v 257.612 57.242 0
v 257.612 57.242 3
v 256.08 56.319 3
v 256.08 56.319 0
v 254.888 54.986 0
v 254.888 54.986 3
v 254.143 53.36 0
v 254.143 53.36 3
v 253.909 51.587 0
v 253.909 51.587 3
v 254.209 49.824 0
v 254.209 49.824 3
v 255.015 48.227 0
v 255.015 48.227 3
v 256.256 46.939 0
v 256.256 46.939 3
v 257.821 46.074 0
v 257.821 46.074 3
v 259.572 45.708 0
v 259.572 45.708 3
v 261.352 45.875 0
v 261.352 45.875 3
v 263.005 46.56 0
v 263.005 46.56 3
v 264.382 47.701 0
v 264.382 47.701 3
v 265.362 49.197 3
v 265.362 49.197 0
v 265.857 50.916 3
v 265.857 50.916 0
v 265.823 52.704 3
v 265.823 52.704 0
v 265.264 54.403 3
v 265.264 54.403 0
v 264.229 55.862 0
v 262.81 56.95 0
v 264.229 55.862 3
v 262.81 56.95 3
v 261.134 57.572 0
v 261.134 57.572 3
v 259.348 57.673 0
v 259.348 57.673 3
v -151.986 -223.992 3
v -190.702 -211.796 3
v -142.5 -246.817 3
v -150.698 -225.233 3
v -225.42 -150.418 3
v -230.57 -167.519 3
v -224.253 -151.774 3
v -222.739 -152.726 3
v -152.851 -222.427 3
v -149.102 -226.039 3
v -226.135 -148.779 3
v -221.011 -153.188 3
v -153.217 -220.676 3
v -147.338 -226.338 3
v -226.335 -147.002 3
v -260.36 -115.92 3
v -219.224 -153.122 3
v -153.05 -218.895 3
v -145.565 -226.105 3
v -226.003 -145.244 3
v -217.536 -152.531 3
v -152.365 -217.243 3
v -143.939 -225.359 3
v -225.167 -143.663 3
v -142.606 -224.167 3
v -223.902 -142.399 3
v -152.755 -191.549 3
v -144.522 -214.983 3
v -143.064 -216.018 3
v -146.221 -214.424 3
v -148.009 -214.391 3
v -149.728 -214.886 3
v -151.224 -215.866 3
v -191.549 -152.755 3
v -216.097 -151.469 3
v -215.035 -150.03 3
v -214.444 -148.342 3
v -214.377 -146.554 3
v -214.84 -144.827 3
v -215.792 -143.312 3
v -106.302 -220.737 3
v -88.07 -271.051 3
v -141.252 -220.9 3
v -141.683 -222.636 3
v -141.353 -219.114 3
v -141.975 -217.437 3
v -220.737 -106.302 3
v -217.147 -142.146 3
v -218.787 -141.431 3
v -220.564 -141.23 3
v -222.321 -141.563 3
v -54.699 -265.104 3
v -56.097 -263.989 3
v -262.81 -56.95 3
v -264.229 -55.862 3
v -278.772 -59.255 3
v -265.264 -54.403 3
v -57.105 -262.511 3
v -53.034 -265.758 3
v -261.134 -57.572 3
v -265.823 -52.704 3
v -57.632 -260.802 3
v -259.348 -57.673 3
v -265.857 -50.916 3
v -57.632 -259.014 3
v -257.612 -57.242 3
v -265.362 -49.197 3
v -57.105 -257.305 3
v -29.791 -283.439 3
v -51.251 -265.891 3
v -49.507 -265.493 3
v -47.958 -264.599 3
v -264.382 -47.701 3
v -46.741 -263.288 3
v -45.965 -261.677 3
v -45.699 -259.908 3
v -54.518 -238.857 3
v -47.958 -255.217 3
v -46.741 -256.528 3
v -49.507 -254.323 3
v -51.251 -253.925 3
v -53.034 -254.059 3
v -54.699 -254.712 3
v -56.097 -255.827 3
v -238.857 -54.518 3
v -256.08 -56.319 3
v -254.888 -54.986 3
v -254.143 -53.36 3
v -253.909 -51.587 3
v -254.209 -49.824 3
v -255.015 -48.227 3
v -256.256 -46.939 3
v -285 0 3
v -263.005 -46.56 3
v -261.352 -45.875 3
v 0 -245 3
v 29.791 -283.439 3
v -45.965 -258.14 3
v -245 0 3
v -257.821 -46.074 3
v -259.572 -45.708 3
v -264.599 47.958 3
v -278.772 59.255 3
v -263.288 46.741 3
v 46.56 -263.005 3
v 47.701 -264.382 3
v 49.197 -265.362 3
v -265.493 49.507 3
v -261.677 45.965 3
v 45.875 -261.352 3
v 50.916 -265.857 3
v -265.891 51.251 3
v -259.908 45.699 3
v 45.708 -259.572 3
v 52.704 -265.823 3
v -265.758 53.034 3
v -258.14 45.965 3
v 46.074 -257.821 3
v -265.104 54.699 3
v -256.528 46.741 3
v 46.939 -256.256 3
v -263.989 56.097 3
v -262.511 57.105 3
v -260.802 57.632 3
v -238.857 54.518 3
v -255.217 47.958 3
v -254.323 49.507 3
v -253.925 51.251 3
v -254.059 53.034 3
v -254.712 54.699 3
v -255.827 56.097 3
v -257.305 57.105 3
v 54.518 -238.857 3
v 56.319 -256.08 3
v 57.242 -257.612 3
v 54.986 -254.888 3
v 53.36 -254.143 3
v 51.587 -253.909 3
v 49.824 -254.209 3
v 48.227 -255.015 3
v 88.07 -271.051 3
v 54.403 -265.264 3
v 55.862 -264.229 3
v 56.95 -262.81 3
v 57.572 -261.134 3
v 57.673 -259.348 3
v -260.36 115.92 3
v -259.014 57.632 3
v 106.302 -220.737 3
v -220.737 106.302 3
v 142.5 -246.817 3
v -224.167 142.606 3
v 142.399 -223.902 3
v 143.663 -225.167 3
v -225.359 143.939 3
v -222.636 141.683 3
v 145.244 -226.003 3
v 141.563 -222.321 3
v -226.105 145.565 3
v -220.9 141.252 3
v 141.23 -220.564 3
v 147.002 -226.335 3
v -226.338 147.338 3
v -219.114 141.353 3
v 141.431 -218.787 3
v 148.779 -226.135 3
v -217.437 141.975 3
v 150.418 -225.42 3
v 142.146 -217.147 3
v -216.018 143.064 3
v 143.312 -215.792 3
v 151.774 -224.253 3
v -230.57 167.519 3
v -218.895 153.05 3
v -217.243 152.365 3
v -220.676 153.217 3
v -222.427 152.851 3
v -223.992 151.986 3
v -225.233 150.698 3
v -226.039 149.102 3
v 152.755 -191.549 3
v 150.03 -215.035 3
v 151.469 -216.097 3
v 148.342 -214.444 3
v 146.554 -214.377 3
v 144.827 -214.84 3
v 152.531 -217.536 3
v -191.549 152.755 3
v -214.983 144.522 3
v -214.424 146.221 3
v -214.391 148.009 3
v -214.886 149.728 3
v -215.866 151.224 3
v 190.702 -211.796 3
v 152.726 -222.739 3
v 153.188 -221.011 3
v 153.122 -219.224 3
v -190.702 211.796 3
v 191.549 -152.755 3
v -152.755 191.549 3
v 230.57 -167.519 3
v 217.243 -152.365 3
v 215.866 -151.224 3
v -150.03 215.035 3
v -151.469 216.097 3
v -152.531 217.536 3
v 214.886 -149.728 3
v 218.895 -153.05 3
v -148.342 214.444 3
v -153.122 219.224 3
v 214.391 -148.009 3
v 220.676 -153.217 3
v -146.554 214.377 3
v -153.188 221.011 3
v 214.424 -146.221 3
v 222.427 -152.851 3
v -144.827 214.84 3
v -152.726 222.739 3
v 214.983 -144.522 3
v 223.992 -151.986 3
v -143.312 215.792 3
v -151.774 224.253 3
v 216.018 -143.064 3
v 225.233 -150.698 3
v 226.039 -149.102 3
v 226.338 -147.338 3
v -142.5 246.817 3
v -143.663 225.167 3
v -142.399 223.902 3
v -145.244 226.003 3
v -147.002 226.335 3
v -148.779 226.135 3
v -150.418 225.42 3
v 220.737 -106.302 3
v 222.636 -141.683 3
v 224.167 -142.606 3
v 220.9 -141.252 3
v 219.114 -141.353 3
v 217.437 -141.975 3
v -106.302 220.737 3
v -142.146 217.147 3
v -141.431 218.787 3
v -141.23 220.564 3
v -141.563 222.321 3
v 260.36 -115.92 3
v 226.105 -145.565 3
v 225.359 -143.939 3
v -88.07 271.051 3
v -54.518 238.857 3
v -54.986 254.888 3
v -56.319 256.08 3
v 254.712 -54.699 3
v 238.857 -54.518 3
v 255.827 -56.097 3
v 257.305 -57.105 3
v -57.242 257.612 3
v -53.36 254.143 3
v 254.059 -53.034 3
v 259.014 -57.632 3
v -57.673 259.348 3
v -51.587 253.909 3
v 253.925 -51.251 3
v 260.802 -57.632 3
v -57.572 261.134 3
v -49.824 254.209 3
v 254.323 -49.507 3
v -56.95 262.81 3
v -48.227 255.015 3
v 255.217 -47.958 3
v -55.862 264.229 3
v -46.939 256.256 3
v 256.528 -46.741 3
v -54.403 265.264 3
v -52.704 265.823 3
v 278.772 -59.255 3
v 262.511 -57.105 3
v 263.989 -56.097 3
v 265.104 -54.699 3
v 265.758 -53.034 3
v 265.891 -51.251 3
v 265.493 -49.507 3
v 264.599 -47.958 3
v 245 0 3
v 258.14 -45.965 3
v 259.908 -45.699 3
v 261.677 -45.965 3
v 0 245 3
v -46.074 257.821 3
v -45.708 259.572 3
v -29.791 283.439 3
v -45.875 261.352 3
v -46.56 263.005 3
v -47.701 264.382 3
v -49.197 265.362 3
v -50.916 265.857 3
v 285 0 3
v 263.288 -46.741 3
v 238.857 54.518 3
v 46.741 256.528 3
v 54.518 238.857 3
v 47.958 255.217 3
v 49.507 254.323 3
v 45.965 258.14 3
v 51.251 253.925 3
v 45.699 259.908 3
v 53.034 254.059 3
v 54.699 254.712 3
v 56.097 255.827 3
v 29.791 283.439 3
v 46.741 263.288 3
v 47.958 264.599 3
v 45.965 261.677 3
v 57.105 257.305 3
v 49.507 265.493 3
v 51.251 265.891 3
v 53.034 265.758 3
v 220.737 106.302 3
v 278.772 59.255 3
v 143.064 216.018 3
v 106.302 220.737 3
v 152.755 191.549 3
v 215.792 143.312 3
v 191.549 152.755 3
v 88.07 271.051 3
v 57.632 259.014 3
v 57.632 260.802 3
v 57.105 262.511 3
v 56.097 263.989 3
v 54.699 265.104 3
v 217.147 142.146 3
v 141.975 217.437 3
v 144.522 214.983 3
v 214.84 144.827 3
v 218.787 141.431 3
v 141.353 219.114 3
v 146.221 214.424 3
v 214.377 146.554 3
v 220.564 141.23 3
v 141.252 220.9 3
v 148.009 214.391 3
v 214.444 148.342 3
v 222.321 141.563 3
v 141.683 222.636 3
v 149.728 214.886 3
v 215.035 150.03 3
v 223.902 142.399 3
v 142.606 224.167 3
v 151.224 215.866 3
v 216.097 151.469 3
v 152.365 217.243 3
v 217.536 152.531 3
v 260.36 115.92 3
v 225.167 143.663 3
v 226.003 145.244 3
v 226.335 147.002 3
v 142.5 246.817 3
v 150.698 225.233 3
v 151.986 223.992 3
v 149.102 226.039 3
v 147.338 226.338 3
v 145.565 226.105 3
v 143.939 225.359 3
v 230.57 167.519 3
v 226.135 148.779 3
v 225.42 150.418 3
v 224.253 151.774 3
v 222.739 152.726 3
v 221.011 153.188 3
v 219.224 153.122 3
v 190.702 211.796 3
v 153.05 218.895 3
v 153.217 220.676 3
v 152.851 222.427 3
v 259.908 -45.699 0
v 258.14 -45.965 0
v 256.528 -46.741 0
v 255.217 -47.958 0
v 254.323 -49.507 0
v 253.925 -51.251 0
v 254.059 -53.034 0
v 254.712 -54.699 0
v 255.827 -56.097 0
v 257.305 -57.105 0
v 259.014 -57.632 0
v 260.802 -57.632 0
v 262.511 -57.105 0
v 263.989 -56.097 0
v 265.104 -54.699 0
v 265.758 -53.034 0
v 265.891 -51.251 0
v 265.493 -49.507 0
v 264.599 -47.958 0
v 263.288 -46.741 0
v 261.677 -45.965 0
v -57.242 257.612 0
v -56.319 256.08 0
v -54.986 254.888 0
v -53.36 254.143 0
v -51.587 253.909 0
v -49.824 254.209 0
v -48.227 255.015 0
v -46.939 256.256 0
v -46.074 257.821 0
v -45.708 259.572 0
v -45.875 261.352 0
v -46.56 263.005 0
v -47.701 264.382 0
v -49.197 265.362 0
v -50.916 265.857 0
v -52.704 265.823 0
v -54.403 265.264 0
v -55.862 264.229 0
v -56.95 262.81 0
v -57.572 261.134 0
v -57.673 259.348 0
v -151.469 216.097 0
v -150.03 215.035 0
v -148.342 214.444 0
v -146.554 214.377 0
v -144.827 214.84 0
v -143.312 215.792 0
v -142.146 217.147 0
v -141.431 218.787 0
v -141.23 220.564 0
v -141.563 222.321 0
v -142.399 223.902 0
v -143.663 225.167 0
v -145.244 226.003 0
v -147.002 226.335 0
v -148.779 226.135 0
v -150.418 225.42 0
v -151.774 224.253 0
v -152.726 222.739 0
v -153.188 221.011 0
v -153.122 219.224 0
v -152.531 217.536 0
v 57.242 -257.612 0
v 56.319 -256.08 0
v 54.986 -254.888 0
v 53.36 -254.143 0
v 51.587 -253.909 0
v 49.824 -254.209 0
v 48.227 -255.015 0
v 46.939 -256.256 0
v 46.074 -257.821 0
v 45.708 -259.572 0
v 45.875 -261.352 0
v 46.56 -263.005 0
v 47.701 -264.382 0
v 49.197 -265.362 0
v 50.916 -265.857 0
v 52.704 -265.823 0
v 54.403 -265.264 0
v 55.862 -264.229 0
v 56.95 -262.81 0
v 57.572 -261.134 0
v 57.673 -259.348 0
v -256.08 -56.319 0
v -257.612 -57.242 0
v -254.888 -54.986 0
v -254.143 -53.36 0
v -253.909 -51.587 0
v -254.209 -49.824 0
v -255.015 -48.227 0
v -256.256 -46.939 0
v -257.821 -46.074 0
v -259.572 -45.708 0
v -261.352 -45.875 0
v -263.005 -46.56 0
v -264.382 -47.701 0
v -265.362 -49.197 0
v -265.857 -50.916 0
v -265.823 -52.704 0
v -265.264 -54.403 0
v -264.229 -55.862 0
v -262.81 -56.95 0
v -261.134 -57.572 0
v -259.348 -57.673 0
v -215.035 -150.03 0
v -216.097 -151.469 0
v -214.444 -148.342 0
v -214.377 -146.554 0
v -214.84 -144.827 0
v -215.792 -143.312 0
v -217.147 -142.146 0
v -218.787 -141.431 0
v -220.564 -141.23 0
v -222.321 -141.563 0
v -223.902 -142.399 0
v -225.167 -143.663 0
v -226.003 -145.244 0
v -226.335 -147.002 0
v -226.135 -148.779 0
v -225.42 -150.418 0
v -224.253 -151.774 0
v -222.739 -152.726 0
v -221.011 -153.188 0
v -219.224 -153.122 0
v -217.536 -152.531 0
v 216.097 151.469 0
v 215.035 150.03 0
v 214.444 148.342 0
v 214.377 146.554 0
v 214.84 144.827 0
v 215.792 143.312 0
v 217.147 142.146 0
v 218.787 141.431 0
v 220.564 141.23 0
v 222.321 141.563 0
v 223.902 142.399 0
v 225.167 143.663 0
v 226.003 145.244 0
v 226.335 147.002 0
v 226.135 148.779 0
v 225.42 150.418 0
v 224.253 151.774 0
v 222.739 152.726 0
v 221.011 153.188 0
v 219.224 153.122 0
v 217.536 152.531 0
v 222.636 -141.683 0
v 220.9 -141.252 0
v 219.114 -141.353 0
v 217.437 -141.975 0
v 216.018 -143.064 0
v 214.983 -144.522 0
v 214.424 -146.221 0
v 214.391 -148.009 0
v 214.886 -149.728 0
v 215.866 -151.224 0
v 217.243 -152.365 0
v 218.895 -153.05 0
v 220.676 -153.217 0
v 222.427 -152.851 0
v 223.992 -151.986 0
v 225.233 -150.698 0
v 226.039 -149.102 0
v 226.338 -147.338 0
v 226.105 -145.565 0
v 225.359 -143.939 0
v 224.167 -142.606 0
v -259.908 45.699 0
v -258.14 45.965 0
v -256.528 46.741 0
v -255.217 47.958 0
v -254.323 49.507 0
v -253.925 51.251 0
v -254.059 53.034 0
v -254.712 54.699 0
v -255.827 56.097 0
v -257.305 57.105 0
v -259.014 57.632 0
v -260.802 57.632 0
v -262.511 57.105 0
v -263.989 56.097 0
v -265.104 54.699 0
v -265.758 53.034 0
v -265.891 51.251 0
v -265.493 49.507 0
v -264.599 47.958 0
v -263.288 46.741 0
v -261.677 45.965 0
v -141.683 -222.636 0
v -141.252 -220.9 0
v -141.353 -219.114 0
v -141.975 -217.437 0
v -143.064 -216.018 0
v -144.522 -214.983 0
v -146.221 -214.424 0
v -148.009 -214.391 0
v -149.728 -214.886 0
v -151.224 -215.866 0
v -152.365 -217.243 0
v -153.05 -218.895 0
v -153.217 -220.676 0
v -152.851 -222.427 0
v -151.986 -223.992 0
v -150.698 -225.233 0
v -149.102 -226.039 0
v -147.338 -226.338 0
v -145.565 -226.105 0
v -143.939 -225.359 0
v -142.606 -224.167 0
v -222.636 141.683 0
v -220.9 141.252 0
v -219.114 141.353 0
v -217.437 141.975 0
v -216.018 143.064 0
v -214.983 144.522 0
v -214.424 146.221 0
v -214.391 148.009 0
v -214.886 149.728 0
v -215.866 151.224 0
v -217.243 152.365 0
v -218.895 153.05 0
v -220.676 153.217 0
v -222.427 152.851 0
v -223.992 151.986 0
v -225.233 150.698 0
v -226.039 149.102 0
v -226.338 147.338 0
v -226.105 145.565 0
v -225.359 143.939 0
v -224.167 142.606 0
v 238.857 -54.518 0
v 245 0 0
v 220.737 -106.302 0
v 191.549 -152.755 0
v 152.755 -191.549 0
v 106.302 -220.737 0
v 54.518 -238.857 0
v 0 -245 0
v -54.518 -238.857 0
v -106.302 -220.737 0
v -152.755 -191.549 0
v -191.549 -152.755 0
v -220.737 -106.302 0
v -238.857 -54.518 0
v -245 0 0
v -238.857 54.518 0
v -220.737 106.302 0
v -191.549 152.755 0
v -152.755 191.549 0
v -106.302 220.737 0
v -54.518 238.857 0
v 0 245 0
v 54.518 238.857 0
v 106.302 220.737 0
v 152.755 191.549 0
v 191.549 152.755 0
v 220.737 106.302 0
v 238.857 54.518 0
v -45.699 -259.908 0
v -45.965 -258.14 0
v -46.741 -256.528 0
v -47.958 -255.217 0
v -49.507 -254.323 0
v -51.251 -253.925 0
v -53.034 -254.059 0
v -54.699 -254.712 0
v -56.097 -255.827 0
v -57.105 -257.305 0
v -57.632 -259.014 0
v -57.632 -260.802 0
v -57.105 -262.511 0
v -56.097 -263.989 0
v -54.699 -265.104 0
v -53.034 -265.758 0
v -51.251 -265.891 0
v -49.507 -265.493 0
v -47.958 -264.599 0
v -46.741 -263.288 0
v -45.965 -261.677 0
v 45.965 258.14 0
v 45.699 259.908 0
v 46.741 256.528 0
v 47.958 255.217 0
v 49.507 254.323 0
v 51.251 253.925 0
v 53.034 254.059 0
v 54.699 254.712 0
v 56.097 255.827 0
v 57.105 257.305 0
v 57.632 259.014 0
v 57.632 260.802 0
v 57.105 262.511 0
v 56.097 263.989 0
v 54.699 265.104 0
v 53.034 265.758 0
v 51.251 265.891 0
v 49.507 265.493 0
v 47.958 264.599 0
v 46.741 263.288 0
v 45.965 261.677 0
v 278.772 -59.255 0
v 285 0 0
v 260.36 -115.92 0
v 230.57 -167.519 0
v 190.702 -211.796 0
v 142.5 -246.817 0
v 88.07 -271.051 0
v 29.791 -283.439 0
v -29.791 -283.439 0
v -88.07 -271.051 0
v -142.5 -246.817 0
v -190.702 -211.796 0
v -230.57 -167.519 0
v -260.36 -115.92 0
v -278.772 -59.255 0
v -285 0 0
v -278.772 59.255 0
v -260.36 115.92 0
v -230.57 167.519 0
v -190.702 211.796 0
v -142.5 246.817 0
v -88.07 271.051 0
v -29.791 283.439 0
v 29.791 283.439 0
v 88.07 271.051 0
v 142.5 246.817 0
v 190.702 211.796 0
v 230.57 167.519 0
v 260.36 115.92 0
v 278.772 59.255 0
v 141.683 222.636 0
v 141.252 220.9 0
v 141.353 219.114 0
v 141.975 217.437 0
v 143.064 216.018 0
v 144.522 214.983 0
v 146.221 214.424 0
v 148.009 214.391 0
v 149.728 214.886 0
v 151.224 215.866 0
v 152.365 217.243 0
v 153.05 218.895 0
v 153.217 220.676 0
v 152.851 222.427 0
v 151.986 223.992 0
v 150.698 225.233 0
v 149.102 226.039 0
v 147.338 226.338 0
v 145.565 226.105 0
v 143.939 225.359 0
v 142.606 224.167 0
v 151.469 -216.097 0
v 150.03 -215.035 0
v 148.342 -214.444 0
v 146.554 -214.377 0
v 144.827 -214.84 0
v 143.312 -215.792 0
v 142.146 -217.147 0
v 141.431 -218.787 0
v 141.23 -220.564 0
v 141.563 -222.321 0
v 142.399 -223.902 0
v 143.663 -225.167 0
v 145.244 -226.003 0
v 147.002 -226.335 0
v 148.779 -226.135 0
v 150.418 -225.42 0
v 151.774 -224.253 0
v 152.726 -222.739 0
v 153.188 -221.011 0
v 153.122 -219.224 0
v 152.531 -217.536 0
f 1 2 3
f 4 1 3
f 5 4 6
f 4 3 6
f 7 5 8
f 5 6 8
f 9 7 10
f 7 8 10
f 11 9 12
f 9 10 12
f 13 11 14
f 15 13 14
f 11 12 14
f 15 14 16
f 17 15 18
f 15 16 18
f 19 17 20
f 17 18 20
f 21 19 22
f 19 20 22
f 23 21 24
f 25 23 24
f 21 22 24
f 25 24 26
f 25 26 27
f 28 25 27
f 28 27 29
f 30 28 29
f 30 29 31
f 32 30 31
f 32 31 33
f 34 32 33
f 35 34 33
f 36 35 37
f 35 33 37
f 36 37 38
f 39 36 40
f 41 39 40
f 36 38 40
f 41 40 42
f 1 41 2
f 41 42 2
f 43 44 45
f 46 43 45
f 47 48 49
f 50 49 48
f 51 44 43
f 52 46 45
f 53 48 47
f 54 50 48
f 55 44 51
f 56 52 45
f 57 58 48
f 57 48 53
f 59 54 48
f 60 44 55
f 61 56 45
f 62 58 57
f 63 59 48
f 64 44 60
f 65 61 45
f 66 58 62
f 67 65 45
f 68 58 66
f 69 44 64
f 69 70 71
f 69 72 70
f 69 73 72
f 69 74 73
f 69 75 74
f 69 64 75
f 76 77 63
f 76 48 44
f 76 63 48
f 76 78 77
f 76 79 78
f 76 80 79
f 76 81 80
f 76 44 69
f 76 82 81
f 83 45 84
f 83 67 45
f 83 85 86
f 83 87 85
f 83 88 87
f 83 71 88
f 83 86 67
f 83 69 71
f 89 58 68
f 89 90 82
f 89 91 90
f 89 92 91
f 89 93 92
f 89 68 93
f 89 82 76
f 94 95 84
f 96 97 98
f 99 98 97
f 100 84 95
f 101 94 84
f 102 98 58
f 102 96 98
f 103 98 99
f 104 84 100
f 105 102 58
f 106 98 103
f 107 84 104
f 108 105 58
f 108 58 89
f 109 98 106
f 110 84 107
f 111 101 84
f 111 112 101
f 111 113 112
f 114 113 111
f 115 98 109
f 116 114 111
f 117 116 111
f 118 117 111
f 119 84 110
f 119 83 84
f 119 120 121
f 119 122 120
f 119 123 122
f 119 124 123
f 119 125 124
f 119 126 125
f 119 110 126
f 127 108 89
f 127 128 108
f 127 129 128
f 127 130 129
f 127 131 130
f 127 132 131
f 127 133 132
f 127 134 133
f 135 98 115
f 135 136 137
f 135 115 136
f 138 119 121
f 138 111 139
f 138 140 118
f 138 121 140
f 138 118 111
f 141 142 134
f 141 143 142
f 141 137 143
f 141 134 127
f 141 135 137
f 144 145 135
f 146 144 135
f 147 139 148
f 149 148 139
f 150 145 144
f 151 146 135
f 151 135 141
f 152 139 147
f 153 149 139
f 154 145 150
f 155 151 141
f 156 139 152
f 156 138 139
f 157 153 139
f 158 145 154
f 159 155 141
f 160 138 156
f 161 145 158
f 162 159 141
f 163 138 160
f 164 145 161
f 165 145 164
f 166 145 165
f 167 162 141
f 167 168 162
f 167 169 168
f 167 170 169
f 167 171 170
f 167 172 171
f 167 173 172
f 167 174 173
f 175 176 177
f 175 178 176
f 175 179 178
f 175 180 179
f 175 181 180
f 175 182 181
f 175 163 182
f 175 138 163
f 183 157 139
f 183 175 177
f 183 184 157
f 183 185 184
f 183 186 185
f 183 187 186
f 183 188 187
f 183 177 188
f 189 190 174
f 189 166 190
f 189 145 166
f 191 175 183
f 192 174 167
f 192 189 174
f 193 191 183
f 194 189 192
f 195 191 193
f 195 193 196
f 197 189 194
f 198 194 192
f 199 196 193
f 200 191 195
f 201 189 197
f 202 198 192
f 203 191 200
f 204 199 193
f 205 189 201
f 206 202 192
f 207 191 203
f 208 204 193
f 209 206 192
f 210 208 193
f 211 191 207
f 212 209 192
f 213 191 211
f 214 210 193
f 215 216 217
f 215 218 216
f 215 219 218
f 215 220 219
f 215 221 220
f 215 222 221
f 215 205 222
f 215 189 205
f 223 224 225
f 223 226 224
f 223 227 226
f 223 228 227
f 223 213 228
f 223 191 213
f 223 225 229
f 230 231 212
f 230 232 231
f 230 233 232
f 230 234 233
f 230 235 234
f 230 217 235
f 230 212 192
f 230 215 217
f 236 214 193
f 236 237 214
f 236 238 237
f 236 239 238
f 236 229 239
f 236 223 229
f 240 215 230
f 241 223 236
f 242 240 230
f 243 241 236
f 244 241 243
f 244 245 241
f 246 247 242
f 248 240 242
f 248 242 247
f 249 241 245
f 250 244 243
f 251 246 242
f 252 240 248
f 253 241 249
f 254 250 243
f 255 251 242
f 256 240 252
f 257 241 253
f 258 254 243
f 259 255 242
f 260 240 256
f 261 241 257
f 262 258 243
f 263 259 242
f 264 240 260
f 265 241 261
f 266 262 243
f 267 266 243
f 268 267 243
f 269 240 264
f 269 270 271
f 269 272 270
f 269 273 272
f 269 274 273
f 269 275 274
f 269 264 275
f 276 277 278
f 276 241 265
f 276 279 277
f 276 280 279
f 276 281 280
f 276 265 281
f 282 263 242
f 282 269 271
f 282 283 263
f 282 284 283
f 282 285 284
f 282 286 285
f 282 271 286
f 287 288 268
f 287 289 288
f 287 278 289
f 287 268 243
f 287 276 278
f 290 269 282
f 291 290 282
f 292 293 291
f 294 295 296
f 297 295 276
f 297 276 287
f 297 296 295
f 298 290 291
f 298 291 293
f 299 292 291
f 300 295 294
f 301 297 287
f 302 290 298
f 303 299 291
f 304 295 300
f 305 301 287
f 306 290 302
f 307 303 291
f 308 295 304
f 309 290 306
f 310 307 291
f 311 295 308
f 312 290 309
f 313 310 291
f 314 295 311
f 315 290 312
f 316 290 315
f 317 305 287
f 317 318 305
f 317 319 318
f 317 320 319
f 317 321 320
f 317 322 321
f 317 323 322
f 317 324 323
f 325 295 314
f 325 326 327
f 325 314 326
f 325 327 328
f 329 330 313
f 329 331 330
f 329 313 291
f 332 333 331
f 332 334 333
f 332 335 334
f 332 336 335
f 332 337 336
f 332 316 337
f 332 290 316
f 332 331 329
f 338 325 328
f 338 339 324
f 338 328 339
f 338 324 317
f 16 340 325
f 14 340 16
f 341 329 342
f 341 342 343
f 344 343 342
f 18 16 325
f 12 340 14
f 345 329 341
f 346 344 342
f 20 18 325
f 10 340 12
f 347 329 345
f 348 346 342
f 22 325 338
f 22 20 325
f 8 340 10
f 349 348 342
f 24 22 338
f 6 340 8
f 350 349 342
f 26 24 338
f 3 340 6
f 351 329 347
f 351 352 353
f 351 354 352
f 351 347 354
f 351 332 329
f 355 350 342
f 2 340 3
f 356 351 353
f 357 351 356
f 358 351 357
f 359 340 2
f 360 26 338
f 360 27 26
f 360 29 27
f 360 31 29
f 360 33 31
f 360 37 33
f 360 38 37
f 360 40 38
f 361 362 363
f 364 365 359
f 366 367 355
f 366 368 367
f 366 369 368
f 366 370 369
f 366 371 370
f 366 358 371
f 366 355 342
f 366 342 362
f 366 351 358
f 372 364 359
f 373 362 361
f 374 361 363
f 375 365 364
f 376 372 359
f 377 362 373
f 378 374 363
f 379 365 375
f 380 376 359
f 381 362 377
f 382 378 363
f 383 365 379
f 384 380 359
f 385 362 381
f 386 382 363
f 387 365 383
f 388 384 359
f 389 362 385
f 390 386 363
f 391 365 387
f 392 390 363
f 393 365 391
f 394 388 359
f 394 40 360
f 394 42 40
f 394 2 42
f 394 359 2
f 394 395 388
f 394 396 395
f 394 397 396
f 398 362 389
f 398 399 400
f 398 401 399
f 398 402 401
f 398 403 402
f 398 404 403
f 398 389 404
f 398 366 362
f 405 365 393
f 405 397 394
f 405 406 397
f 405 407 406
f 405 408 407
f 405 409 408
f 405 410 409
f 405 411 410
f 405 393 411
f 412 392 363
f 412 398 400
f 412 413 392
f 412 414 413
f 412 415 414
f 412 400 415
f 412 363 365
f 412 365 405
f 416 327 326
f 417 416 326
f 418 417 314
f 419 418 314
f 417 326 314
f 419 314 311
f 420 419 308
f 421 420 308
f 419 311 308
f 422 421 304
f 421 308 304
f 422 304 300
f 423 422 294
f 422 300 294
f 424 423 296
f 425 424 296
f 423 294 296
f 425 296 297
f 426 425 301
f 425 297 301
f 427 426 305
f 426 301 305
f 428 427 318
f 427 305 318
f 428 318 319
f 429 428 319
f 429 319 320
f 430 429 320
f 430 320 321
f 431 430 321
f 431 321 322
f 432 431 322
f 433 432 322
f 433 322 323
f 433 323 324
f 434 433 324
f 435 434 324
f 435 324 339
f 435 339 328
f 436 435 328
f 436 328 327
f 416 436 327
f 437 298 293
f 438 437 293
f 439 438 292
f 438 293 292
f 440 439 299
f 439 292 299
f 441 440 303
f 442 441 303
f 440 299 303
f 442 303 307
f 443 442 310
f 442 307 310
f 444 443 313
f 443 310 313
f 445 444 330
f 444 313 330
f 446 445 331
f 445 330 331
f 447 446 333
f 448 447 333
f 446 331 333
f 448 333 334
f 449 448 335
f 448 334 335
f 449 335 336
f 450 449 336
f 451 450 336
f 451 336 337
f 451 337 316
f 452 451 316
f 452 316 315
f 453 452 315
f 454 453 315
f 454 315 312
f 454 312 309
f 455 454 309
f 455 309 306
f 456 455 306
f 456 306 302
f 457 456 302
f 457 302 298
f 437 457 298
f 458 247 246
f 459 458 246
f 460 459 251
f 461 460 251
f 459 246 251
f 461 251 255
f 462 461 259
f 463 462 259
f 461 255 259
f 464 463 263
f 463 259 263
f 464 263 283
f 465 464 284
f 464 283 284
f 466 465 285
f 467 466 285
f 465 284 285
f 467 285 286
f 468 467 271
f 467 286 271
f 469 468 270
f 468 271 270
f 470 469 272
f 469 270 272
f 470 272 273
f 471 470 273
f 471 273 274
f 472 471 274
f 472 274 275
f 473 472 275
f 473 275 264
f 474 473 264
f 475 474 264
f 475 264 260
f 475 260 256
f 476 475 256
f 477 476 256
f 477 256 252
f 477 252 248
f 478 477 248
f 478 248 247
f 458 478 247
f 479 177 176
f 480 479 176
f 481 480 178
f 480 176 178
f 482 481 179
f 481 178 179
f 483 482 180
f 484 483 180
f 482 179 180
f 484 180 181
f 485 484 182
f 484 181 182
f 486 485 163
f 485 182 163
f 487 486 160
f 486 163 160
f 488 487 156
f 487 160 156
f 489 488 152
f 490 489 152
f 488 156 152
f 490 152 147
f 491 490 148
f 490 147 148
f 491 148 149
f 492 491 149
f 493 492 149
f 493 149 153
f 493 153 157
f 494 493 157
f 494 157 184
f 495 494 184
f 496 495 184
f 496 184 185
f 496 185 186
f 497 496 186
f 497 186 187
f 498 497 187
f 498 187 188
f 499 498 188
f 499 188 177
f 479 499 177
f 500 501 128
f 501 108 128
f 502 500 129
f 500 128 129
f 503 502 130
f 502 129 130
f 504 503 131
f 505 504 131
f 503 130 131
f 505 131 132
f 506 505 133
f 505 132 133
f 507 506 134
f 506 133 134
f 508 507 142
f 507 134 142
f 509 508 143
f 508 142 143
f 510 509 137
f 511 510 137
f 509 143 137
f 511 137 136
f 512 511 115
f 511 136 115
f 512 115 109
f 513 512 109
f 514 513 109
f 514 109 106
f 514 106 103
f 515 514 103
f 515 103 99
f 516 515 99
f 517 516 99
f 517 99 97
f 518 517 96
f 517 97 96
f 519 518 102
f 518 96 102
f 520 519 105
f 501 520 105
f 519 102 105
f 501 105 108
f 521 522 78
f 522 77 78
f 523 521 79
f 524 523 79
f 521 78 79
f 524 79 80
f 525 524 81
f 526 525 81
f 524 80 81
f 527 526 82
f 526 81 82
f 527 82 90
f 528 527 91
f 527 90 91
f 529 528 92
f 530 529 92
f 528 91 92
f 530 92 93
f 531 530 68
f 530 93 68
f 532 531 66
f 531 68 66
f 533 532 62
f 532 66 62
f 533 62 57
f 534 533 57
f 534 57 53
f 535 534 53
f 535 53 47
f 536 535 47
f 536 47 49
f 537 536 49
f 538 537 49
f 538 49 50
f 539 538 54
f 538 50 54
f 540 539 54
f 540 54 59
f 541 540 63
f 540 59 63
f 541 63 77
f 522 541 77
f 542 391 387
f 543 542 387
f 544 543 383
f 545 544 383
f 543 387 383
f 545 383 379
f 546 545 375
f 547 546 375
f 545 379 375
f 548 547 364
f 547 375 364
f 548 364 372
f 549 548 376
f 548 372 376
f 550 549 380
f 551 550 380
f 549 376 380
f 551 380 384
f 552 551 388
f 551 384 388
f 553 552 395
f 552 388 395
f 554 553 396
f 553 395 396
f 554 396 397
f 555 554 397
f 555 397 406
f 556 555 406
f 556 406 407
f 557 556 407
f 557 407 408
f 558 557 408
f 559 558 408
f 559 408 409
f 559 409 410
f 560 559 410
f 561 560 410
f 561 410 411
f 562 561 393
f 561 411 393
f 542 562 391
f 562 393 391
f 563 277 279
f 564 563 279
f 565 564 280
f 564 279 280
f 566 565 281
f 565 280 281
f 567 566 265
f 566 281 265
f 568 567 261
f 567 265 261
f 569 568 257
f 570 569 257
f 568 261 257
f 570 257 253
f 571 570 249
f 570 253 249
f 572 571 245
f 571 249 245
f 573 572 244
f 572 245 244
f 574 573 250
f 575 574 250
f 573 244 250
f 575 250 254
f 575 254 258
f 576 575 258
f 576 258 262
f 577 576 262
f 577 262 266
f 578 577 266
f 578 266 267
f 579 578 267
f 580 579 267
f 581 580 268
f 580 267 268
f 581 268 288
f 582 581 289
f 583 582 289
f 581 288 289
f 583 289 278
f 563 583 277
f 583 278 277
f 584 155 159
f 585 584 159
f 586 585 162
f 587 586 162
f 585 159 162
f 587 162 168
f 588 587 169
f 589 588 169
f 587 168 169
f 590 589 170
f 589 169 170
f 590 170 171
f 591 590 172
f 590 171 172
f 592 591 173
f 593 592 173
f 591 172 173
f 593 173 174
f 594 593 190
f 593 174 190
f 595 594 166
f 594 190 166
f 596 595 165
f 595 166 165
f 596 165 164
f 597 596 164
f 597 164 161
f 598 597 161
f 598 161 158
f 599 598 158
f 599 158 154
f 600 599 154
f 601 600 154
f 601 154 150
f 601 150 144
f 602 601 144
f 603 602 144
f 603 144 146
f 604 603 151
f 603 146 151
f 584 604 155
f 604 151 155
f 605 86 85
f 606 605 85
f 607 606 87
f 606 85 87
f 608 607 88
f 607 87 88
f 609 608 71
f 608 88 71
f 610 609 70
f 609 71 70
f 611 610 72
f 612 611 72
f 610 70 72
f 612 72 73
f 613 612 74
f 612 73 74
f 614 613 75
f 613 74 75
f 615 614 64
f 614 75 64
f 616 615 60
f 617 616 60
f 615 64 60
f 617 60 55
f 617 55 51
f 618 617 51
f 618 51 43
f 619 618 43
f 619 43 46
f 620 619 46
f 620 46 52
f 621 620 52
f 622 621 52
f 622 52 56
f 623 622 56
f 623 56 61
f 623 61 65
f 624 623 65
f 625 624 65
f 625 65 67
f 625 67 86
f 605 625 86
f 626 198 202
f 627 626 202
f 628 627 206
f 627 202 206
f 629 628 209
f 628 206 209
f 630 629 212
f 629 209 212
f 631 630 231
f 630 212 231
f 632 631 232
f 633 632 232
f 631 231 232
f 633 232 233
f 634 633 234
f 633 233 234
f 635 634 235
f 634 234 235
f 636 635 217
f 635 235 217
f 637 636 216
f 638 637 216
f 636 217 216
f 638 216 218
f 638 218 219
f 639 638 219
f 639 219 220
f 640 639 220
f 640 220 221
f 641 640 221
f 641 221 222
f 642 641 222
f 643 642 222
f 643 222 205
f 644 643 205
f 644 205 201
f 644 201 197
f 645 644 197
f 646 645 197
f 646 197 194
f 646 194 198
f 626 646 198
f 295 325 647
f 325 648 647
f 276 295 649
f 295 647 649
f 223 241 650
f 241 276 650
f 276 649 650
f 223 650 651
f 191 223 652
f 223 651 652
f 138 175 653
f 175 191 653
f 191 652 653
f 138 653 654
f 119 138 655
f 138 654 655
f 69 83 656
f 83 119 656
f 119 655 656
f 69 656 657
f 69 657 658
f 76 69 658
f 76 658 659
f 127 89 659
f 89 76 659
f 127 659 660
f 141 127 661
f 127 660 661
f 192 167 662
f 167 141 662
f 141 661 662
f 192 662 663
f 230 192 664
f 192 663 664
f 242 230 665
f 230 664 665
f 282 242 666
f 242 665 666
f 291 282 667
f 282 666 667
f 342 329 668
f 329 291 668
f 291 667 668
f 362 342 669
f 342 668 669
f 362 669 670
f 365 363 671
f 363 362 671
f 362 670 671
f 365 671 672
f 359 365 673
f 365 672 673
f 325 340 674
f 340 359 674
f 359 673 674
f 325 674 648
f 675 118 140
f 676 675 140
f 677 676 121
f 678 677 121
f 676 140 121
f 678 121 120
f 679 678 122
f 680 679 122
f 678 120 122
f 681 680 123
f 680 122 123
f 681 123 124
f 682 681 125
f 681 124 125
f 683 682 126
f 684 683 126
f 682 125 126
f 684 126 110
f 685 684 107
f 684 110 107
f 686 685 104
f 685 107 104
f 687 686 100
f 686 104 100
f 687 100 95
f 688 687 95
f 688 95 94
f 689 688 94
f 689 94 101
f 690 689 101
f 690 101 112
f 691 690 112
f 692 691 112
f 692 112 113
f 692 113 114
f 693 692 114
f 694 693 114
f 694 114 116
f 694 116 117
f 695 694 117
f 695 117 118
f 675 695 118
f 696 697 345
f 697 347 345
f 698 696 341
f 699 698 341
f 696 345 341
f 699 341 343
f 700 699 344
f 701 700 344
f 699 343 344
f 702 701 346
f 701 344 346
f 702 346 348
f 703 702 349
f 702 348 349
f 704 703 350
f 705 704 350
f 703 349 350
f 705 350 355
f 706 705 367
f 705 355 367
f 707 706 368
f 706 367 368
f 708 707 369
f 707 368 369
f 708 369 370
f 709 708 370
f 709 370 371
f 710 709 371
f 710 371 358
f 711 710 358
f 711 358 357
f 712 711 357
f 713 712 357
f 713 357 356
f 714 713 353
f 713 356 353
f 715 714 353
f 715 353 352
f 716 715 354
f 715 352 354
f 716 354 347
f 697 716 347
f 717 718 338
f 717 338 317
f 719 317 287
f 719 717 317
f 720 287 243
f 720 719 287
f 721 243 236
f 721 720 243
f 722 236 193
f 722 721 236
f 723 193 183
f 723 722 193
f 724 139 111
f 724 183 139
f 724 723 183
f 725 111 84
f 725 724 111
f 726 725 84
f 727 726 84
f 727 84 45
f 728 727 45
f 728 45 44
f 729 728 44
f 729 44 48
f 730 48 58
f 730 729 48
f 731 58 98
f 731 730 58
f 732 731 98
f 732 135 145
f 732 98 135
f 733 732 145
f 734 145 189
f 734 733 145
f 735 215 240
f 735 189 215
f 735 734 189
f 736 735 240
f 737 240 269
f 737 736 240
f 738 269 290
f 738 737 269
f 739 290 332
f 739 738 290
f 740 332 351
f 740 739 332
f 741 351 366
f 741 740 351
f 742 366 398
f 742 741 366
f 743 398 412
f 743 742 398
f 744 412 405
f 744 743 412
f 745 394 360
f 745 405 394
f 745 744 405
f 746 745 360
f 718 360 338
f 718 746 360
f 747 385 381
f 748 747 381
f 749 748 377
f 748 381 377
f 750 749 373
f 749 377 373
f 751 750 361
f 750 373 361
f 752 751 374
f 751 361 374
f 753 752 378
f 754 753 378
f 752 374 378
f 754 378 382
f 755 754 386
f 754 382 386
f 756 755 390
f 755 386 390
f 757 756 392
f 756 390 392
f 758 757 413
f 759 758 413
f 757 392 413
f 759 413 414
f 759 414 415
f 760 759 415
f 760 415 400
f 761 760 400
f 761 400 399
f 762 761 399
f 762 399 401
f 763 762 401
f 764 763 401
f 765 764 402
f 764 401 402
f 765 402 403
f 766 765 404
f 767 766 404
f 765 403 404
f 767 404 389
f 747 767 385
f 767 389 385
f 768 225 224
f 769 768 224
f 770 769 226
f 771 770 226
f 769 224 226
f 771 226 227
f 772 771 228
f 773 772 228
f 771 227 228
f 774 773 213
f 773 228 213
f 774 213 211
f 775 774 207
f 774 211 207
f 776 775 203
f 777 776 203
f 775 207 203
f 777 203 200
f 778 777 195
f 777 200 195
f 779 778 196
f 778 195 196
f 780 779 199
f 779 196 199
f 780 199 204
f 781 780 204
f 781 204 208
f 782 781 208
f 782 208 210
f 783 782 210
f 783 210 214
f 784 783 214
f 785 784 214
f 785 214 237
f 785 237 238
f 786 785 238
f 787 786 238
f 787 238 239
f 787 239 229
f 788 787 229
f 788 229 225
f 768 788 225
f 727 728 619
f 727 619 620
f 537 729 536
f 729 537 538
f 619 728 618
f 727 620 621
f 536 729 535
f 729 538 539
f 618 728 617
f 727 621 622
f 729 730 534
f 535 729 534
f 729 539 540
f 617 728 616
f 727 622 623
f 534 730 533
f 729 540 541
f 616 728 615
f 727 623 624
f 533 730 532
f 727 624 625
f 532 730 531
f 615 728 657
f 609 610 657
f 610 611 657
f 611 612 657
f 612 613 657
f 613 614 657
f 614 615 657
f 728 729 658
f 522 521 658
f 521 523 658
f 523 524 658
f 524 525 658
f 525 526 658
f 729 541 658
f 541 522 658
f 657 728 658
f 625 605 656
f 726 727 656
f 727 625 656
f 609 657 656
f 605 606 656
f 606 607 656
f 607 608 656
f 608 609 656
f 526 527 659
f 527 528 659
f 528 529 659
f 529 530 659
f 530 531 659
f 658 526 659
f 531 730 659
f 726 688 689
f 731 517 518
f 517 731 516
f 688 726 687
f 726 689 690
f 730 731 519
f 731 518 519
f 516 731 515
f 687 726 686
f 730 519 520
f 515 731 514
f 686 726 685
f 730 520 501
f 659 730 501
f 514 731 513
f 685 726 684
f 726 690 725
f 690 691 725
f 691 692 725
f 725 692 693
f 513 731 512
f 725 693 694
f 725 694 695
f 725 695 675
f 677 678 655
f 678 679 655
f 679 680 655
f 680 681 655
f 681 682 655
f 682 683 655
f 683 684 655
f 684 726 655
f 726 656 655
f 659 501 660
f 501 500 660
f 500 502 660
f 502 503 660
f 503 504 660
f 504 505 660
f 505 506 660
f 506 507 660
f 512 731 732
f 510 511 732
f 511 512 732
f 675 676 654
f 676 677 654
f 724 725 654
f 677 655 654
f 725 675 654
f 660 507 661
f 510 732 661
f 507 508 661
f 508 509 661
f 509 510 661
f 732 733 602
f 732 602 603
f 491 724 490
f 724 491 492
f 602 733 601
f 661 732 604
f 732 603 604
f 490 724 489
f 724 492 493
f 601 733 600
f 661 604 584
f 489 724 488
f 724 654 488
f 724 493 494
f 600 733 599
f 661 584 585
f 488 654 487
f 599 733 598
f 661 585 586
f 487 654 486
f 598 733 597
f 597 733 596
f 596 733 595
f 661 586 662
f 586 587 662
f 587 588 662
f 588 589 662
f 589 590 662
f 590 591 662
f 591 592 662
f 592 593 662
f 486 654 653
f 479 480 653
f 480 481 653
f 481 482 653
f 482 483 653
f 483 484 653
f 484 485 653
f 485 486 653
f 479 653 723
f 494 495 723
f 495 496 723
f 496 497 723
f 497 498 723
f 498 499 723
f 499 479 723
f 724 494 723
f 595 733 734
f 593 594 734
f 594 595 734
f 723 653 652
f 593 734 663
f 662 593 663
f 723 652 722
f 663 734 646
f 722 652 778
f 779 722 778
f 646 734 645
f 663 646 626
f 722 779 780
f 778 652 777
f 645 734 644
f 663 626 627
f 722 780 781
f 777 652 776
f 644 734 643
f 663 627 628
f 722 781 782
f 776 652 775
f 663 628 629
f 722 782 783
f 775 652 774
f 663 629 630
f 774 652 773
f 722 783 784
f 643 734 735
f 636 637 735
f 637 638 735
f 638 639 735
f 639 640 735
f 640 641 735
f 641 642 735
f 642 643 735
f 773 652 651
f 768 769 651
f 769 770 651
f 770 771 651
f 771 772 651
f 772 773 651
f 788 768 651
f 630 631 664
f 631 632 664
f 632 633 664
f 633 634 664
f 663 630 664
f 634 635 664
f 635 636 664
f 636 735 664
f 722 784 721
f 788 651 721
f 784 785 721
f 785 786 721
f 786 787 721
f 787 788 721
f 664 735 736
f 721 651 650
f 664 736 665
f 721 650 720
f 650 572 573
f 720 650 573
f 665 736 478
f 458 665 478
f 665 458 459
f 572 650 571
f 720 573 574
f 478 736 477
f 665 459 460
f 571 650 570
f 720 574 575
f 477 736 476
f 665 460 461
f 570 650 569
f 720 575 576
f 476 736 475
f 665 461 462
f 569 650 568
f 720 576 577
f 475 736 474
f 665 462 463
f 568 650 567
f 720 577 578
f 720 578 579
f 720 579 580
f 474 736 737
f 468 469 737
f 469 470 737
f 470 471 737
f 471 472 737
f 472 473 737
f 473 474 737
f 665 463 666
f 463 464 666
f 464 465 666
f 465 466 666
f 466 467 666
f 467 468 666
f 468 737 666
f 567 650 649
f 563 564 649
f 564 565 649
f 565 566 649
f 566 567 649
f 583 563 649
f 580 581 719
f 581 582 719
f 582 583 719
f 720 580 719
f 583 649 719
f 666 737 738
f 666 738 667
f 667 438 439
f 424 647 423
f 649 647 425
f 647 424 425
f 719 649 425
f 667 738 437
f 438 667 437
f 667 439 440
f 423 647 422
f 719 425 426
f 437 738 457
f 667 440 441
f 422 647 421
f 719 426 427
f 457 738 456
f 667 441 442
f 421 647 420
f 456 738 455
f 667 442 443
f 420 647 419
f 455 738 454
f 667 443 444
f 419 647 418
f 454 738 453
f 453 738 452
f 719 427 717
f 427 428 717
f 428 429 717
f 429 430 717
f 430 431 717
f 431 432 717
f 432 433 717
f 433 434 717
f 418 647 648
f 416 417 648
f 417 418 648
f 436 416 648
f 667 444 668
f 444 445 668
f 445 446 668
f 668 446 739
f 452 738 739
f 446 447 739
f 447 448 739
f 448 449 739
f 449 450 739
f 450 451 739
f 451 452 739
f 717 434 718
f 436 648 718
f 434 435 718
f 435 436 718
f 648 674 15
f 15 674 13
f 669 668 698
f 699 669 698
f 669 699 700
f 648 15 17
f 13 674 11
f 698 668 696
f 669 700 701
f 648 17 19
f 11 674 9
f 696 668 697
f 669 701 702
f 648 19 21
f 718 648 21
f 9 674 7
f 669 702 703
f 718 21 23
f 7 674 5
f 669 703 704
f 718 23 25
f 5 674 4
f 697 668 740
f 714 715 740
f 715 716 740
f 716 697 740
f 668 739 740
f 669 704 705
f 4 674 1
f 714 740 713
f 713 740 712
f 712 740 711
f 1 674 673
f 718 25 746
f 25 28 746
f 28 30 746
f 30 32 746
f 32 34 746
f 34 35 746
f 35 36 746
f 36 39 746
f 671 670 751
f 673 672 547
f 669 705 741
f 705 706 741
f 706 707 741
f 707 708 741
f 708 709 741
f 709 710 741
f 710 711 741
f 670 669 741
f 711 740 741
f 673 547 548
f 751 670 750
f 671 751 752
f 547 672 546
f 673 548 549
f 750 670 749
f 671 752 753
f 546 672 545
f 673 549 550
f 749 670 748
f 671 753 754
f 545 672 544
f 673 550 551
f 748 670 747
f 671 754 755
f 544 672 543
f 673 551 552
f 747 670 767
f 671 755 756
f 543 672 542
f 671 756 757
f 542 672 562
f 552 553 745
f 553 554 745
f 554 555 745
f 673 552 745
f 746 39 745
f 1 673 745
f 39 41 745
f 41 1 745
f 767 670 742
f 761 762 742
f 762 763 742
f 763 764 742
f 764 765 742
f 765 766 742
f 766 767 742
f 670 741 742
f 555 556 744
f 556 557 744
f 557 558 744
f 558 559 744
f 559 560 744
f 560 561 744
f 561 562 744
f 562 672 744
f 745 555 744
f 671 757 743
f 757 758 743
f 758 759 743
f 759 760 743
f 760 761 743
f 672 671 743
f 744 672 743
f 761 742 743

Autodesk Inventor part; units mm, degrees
ref_plane "YZ Plane" through (0, 0, 0) normal (1, 0, 0) x (0, 1, 0)
ref_plane "XZ Plane" through (0, 0, 0) normal (0, 1, 0) x (-1, 0, 0)
ref_plane "XY Plane" through (0, 0, 0) normal (0, 0, 1) x (1, 0, 0)
sketch "Sketch1" plane through (0, 0, 0) normal (0, 0, 1) x (1, 0, 0)
  circle A0 centre (0, 0) radius 245
  circle A1 centre (0, 0) radius 285
  circle A2 centre (0, 0) radius 265 construction
  line L0 (0, 285) -> (0, 245) construction
  point P0 (0, 265)
  dimension "d9" = 530
  dimension "d11" = 40
extrude "Plate1" add sketch "Sketch1" along normal blind 3
sketch "Sketch2" plane through (0, 0, 3) normal (0, 0, 1) x (1, 0, 0)
  circle A0 centre (0, 0) radius 245 construction
  circle A1 centre (0, 0) radius 285 construction
  circle A2 centre (0, 0) radius 285 projected
  circle A3 centre (0, 0) radius 245 projected
  line L0 (0, 0) -> (0, -285) construction
  line L1 (0, 0) -> (-55.6007, -279.5238) construction
  line L2 (-47.7971, -240.2924) -> (-55.6007, -279.5238) construction
  circle A4 centre (-51.6989, -259.9081) radius 6
  dimension "d20" = 11.25
  dimension "d21" = 12
extrude "Extrusion1" cut sketch "Sketch2" against normal through all contours A4
sketch "Sketch3" plane through (0, 0, 3) normal (0, 0, 1) x (1, 0, 0)
  circle A0 centre (0, 0) radius 245 projected
  line L0 (-245, 0) -> (-250, 0) construction
  line L1 (-250, 5) -> (-250, -5)
  line L2 (-250, 5) -> (-244.949, 5)
  line L3 (-250, -5) -> (-244.949, -5)
  line L4 (245, 0) -> (250, 0) construction
  line L5 (250, 5) -> (250, -5)
  line L6 (250, 5) -> (244.949, 5)
  line L7 (250, -5) -> (244.949, -5)
  dimension "d23" = 5
  dimension "d24" = 10
extrude "Extrusion2" [suppressed]
pattern_circular "Circular Pattern2" count 16 over 360 about axis through (0, 0, 0) along (0, 0, 1) of "Extrusion1"
equation "\"d9\" = Шпил_пласт_КОРМА_диам_центров"
equation "\"d11\" = Шпил_пласт_КОРМА_ширина"
equation "\"d21\" = Шпил_пласт_КОРМА_диам_шпильки"
equation "\"d2\" = Thickness"
equation "\"BendRadius\" = Thickness"
equation "\"BendReliefWidth\" = Thickness"
equation "\"BendReliefDepth\" = 0.5 * Thickness"
equation "\"CornerReliefSize\" = 4 * Thickness"
equation "\"MinimumRemnant\" = 2 * Thickness"
equation "\"TransitionRadius\" = BendRadius"
equation "\"JacobiRadiusSize\" = BendRadius"
equation "\"GapSize\" = Thickness"
equation "\"Шпил_пласт_КОРМА_диам_центров\" = 530"
equation "\"Шпил_пласт_КОРМА_ширина\" = 40"
equation "\"Шпил_пласт_КОРМА_диам_шпильки\" = 12"
equation "\"Thickness\" = 3"
properties part number "ДМФ 041 кольцо под шпильки КОРМА v2.0"
